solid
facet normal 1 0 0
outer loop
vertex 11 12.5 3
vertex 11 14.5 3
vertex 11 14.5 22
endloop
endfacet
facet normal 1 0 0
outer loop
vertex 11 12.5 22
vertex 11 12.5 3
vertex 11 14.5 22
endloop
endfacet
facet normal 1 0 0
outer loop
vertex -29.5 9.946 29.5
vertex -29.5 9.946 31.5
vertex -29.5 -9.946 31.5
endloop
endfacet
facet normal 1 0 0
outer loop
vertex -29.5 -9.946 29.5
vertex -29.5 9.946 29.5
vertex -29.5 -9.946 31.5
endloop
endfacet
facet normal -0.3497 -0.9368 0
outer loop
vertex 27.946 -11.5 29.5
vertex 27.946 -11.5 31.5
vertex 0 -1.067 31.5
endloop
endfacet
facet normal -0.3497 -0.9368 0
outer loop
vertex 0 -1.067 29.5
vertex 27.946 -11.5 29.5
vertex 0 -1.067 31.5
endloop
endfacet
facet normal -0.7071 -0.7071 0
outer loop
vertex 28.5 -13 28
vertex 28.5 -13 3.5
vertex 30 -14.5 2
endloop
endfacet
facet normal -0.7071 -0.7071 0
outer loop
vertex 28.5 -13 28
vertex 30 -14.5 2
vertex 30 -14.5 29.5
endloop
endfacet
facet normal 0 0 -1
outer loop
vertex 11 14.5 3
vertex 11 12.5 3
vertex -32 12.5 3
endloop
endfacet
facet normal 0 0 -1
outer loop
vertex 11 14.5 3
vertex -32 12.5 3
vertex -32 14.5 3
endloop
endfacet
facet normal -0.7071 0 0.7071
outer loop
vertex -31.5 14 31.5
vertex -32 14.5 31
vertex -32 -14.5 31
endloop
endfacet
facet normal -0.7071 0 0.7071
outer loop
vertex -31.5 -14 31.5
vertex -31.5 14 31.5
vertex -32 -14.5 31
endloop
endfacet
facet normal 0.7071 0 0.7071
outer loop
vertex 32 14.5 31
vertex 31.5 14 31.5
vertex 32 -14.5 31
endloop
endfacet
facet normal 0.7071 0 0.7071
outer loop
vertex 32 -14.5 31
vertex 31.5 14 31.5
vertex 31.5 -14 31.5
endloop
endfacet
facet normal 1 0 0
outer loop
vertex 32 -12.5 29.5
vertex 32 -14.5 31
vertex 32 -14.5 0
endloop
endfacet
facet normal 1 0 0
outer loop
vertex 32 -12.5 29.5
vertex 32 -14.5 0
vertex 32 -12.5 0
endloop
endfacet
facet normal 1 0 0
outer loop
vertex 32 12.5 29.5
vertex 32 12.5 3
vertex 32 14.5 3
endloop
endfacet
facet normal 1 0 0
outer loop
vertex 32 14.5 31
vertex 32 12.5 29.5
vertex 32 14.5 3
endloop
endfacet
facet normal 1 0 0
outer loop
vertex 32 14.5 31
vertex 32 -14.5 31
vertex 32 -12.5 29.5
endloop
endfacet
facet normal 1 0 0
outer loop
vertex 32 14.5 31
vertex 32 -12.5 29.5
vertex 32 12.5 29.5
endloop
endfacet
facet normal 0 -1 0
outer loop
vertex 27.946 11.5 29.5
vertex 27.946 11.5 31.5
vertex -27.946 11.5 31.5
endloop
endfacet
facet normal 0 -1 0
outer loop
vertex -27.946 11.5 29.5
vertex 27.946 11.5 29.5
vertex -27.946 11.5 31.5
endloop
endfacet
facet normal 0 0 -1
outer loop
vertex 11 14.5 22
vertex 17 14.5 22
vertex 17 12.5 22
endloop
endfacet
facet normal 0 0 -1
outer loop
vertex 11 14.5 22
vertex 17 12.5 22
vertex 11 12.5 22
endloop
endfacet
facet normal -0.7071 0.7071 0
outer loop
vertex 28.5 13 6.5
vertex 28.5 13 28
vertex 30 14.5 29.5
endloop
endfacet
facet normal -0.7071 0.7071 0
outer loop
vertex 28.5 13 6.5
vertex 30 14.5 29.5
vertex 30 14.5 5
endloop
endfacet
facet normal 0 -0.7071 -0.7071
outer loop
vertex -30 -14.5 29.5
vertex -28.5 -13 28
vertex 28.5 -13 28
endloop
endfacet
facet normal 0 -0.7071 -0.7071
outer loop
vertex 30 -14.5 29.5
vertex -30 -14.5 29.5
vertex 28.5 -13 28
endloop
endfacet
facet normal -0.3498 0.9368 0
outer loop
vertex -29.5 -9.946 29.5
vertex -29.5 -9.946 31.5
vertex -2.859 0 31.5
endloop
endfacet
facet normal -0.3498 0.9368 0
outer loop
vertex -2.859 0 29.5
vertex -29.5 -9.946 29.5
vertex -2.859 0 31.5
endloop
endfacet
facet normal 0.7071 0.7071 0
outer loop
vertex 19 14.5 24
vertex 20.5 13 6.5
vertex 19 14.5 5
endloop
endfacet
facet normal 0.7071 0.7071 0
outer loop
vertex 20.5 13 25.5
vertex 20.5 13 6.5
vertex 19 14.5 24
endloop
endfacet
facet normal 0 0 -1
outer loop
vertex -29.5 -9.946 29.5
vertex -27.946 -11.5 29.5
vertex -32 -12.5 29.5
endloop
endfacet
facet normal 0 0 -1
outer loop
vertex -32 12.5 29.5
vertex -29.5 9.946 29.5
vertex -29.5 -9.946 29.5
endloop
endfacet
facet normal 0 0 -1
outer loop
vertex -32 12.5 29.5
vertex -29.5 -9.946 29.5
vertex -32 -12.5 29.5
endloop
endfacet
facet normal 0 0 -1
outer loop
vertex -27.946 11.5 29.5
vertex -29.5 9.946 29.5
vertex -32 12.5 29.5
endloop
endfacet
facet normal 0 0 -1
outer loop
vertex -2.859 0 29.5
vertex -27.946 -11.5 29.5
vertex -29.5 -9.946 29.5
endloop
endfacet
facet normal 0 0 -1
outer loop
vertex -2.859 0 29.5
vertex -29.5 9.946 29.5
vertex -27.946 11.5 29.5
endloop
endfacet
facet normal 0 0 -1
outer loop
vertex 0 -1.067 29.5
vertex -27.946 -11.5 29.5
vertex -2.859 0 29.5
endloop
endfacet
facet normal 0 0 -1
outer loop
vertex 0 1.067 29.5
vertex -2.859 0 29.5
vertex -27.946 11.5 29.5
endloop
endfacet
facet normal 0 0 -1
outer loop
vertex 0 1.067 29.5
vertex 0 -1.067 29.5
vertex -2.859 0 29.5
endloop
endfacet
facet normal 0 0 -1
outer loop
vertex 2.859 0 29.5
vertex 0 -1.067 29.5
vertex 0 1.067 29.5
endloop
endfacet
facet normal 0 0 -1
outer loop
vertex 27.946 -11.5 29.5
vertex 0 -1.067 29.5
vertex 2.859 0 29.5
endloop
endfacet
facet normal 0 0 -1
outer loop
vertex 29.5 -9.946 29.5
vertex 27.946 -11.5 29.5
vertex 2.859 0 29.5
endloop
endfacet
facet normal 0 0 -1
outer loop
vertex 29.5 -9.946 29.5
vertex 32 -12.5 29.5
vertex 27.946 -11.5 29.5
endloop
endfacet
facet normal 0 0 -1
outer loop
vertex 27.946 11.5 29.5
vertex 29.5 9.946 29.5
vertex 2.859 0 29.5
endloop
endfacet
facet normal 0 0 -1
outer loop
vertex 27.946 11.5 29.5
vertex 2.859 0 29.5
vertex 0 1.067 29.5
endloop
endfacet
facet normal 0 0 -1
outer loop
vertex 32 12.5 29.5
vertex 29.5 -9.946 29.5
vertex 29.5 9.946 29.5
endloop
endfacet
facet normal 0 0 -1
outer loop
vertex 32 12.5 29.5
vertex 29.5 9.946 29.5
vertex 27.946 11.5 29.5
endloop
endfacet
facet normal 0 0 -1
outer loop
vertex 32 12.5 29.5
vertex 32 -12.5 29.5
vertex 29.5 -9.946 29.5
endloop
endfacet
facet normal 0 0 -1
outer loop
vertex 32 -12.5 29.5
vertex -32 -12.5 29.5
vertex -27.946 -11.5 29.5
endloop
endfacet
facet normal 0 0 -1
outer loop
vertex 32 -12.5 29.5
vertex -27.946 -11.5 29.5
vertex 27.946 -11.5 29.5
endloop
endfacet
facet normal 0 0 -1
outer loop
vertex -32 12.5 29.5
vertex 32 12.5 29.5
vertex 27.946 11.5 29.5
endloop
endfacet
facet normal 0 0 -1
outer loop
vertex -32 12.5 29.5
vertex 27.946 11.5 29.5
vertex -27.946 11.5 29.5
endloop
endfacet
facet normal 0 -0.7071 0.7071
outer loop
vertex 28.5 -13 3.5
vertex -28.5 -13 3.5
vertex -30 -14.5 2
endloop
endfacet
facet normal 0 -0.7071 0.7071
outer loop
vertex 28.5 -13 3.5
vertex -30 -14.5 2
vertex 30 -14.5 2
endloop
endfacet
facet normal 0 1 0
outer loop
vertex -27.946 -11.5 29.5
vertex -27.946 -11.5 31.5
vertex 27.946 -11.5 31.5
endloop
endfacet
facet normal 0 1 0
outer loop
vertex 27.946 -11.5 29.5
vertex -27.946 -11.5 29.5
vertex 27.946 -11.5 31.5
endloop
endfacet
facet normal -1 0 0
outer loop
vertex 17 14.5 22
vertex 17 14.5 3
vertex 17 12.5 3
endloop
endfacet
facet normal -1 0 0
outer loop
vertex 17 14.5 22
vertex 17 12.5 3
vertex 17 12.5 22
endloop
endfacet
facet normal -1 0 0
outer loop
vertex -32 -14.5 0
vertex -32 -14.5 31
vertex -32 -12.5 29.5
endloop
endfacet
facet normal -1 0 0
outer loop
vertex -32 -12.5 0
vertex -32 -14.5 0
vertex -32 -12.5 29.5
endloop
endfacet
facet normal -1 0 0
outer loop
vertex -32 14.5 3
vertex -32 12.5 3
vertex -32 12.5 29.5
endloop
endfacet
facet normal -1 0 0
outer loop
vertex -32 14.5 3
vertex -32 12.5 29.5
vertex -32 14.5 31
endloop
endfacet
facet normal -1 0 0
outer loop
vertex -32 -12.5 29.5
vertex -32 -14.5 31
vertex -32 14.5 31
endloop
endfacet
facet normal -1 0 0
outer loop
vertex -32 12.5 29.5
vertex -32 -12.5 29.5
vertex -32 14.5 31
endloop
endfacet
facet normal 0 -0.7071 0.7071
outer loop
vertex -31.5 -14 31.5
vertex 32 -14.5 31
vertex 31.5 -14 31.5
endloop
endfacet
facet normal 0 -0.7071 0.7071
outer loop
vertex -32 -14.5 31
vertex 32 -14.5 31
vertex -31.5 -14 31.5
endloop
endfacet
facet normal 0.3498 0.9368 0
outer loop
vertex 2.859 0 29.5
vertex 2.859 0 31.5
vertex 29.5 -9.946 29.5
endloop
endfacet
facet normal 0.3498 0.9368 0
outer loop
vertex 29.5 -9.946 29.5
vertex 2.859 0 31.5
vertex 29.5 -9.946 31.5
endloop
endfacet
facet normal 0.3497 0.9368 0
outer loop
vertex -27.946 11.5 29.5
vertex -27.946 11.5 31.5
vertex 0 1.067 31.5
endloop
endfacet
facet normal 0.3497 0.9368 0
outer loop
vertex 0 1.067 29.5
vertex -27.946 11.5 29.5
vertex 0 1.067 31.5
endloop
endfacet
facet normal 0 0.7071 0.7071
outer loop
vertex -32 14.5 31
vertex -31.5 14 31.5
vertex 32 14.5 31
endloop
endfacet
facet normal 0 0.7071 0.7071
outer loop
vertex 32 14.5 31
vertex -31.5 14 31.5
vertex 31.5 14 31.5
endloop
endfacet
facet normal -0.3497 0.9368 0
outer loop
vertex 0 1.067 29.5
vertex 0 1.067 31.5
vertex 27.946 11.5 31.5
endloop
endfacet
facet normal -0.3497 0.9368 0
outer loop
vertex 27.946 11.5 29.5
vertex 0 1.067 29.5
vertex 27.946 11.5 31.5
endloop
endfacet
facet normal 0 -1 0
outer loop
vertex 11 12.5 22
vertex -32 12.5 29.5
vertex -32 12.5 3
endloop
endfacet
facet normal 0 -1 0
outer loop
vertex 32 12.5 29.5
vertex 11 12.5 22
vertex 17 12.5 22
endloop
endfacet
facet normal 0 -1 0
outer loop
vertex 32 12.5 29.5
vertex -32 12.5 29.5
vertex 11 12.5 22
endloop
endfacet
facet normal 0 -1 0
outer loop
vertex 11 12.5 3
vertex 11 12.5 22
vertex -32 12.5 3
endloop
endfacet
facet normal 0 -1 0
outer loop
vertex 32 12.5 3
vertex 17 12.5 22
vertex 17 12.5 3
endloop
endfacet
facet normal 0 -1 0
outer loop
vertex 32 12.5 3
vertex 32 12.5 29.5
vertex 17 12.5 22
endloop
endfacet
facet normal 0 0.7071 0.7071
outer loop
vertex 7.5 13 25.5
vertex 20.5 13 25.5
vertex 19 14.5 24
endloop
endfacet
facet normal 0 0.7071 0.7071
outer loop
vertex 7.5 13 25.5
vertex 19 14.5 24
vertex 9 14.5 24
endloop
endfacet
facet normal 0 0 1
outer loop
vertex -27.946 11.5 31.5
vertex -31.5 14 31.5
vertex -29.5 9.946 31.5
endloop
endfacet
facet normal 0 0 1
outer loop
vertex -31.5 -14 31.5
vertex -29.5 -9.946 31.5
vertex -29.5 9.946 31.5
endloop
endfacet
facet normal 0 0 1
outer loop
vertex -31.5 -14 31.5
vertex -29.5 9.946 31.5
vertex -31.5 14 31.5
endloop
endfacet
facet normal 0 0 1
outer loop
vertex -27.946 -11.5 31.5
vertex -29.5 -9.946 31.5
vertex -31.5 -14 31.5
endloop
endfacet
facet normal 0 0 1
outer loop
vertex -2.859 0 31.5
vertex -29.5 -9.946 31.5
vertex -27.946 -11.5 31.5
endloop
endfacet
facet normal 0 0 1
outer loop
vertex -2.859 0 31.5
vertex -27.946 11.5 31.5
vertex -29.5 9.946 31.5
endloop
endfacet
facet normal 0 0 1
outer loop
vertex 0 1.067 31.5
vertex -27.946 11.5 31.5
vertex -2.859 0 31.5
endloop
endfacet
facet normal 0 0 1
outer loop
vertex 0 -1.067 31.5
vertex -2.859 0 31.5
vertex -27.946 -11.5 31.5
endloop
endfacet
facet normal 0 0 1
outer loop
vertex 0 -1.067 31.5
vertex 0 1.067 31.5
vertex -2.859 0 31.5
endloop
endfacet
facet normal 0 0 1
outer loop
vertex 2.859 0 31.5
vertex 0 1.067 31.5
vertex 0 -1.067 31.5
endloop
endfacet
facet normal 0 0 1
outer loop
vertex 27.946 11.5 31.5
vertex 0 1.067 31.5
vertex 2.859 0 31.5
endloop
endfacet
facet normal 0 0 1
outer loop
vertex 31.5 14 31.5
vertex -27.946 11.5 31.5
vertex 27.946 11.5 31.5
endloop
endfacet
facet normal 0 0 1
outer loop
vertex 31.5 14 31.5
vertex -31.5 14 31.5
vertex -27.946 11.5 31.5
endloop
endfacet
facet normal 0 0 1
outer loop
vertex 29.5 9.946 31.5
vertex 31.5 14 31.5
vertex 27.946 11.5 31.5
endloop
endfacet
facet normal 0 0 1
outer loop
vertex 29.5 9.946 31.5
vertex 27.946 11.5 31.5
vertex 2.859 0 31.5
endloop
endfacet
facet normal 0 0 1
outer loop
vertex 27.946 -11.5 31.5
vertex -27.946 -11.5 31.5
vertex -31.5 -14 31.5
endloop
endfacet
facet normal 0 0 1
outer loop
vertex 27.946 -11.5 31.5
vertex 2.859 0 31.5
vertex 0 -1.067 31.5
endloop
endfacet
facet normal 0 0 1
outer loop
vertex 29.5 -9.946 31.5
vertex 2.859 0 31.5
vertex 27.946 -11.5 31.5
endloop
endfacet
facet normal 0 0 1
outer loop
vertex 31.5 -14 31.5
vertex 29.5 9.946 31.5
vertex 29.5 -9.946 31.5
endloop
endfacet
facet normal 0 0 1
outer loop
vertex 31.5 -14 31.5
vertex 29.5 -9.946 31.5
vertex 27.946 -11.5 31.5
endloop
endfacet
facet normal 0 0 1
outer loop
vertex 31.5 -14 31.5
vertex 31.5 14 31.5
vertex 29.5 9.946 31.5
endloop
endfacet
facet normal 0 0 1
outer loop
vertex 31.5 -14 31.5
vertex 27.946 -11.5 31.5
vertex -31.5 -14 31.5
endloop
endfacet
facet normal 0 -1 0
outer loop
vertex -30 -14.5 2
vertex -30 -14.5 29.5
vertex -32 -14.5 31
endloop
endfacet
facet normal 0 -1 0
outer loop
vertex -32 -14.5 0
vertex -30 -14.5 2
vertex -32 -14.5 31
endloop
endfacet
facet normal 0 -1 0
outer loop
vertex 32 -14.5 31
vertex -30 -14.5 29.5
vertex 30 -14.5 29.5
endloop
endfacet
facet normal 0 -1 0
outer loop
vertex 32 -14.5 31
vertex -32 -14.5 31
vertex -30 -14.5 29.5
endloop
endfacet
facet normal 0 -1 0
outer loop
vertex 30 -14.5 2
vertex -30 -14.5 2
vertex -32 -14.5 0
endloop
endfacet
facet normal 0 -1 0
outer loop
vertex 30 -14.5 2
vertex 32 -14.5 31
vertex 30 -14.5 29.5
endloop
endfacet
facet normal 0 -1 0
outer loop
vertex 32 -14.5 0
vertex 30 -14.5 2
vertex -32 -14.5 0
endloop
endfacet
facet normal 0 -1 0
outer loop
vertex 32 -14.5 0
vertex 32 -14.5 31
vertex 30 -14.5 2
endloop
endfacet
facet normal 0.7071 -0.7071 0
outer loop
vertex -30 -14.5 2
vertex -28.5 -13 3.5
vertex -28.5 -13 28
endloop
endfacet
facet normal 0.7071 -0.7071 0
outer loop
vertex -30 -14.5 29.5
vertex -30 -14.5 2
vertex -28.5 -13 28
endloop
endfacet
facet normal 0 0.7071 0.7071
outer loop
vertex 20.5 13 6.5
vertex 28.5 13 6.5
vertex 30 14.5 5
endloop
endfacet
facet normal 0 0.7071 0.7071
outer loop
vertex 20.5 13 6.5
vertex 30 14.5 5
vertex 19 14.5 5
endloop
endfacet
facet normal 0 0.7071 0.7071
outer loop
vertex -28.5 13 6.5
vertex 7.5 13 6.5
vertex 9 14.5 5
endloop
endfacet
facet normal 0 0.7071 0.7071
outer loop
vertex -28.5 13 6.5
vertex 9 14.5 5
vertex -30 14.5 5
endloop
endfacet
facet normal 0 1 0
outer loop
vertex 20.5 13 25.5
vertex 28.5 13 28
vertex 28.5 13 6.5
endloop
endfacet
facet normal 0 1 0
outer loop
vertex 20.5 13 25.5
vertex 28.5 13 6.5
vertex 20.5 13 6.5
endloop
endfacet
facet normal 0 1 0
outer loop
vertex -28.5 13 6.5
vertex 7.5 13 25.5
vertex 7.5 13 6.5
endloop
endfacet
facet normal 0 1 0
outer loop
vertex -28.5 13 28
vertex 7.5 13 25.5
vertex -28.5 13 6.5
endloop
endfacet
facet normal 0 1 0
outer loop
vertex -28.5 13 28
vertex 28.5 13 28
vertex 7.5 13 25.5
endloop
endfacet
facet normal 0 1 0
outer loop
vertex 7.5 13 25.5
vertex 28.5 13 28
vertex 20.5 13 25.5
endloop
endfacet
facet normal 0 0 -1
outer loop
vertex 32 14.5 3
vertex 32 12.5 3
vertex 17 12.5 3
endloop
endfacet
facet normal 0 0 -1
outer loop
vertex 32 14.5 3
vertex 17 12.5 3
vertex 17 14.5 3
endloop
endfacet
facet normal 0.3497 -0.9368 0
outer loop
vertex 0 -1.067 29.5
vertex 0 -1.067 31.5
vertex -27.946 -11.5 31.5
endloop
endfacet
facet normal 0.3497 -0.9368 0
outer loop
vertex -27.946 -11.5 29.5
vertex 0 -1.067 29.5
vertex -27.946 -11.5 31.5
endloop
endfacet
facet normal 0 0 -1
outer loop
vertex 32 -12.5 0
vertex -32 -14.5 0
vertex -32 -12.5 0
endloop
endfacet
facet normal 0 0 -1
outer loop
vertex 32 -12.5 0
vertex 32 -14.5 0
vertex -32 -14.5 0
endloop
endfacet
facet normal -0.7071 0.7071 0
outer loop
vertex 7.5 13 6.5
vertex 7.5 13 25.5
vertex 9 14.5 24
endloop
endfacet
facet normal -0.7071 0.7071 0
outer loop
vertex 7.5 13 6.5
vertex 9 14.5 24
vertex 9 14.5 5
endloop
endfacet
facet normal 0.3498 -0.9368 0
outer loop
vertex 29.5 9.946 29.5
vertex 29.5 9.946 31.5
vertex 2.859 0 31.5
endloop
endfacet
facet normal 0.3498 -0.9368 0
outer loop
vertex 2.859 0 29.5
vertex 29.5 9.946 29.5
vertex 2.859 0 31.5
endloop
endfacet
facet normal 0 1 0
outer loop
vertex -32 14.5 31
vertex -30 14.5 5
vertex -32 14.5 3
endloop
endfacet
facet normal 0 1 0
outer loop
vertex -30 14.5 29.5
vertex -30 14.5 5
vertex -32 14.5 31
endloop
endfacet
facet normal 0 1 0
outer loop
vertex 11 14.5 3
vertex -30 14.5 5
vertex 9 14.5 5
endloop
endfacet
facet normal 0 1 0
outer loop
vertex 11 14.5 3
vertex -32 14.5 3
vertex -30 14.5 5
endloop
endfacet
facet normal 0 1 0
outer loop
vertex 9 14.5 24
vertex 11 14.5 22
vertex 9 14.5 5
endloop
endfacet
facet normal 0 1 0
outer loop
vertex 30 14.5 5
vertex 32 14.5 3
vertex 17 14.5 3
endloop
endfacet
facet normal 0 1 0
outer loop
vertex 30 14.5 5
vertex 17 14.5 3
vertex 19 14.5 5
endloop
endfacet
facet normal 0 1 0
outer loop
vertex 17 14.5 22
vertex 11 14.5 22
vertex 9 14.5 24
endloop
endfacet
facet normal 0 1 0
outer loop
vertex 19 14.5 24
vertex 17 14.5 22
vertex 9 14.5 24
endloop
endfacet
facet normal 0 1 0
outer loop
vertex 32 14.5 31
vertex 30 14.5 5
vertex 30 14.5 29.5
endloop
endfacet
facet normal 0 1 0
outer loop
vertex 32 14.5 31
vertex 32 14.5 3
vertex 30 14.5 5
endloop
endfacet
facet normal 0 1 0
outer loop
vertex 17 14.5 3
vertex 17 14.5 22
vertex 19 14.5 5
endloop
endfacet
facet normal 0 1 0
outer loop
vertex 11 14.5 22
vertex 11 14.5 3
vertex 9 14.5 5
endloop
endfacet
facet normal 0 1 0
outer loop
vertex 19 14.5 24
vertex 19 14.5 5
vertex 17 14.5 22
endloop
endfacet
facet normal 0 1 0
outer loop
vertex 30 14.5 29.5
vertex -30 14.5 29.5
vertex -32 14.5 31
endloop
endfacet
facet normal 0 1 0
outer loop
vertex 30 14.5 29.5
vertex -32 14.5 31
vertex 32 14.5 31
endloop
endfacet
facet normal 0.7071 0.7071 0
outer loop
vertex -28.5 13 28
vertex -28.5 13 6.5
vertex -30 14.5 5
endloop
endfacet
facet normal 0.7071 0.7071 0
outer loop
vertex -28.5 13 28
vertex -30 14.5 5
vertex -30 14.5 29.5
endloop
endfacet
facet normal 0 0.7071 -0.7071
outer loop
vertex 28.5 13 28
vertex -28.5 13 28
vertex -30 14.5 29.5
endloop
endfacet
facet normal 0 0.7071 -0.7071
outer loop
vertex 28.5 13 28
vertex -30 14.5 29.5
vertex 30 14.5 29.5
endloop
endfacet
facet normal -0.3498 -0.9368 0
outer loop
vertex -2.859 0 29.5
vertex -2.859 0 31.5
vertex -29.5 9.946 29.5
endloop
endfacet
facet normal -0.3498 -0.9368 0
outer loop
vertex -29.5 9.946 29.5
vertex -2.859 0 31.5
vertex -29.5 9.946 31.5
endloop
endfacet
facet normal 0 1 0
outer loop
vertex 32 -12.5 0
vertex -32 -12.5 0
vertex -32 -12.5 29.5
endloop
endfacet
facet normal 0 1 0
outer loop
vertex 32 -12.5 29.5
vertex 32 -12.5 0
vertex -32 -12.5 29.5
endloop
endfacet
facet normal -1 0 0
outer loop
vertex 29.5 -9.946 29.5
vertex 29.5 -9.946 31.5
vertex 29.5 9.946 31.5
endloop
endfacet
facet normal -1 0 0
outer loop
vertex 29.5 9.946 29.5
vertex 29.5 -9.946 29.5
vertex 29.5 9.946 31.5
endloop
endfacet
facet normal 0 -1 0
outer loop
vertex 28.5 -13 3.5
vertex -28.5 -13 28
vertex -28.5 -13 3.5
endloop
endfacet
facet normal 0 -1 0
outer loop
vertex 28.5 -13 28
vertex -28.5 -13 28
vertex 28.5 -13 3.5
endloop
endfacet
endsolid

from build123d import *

# Parameters (mm, degrees)
F1_DEPTH  = 32
F3_DEPTH  = 1.5
F2_W      = 6
F2_H      = 19
F4_DEPTH  = 2
F5_W      = 60
F5_H      = 27.5
F6_DEPTH  = 1.5
F7_SIZE   = 1.49999
F8_SIZE   = 0.5
F10_DEPTH = 2


# Not quite as in the source:
# - a fillet or chamfer is up to 0.001 mm smaller than in the source, because OpenCascade refuses the exact size


with BuildPart() as f1:
    # F0 (on Right) → F1 (new body, symmetric)
    with BuildSketch(Plane.YZ):
        Polygon((-12.5, 0), (-12.5, 29.5), (12.5, 29.5), (12.5, 3), (14.5, 3), (14.5, 31.5), (-14.5, 31.5), (-14.5, 0), align=None)
    extrude(amount=F1_DEPTH, both=True)

    # F2 (on face) → F3 (cut)
    with BuildSketch(Plane(origin=(0, 14.5, 0), x_dir=(-1, 0, 0), z_dir=(0, 1, 0))):
        Polygon((-9, 5), (30, 5), (30, 29.5), (-30, 29.5), (-30, 5), (-19, 5), (-19, 24), (-9, 24), align=None)
    extrude(amount=-F3_DEPTH, mode=Mode.SUBTRACT)

    # F2 (on face) → F4 (cut)
    with BuildSketch(Plane(origin=(0, 14.5, 0), x_dir=(-1, 0, 0), z_dir=(0, 1, 0))):
        with Locations((-14, 12.5)):
            Rectangle(F2_W, F2_H)
    extrude(amount=-F4_DEPTH, mode=Mode.SUBTRACT)

    # F5 (on face) → F6 (cut)
    with BuildSketch(Plane.XZ.offset(14.5)):
        with Locations((0, 15.75)):
            Rectangle(F5_W, F5_H)
    extrude(amount=-F6_DEPTH, mode=Mode.SUBTRACT)

    # F7 (size 1.5 in the source; OpenCascade refuses exactly that, so slightly less here)
    f7_edges = [f1.edges().sort_by_distance(p)[0] for p in [
        (-30, 13, 17.25),
        (0, 13, 29.5),
        (30, 13, 17.25),
        (9, 13, 14.5),
        (-10.5, 13, 5),
        (24.5, 13, 5),
        (19, 13, 14.5),
        (14, 13, 24),
        (0, -13, 29.5),
        (-30, -13, 15.75),
        (0, -13, 2),
        (30, -13, 15.75),
    ]]
    chamfer(f7_edges, length=F7_SIZE)

    # F8
    f8_edges = [f1.edges().sort_by_distance(p)[0] for p in [
        (0, 14.5, 31.5),
        (0, -14.5, 31.5),
        (32, 0, 31.5),
        (-32, 0, 31.5),
    ]]
    chamfer(f8_edges, length=F8_SIZE)

    # F9 (on face) → F10 (cut)
    with BuildSketch(Plane.XY.offset(31.5)):
        Polygon((27.9455012138, 11.5), (-27.9455012138, 11.5), (0, 1.0674114154), align=None)
        Polygon((-2.8592469416, 0), (-29.5, 9.9455012138), (-29.5, -9.9455012138), align=None)
        Polygon((0, -1.0674114154), (-27.9455012138, -11.5), (27.9455012138, -11.5), align=None)
        Polygon((29.5, -9.9455012138), (29.5, 9.9455012138), (2.8592469416, 0), align=None)
    extrude(amount=-F10_DEPTH, mode=Mode.SUBTRACT)


solid = f1.part
